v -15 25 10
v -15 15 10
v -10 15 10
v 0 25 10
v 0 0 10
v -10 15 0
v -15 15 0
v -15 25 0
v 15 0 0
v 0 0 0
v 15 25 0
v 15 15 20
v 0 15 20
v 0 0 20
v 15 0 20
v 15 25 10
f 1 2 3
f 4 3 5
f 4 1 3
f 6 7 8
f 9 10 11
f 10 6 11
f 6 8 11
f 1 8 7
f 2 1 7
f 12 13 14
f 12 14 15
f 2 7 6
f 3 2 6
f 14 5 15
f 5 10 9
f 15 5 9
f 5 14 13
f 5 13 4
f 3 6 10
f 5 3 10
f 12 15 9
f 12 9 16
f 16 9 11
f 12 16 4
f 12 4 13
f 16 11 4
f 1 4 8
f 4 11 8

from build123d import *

# Parameters (mm, degrees)
BOSS_EXTRUDE1_DEPTH = 20
CUT_EXTRUDE1_DEPTH  = 10
CUT_EXTRUDE3_DEPTH  = 20


with BuildPart() as part:
    # Sketch1 → Boss-Extrude1 (new body)
    with BuildSketch(Plane.XY):
        Polygon((0, 0), (15, 0), (15, 25), (-15, 25), (-15, 15), (-10, 15), align=None)
    extrude(amount=BOSS_EXTRUDE1_DEPTH)

    # Sketch2 → Cut-Extrude1 (cut)
    with BuildSketch(Plane.XY.offset(20)):
        Polygon((0, 0), (0, 25), (-15, 25), (-15, 15), (-10, 15), align=None)
    extrude(amount=-CUT_EXTRUDE1_DEPTH, mode=Mode.SUBTRACT)

    # Sketch3 → Cut-Extrude3 (cut)
    with BuildSketch(Plane.ZY):
        Polygon((10, 25), (20, 15), (20, 25), align=None)
    extrude(amount=-CUT_EXTRUDE3_DEPTH, mode=Mode.SUBTRACT)


solid = part.part
